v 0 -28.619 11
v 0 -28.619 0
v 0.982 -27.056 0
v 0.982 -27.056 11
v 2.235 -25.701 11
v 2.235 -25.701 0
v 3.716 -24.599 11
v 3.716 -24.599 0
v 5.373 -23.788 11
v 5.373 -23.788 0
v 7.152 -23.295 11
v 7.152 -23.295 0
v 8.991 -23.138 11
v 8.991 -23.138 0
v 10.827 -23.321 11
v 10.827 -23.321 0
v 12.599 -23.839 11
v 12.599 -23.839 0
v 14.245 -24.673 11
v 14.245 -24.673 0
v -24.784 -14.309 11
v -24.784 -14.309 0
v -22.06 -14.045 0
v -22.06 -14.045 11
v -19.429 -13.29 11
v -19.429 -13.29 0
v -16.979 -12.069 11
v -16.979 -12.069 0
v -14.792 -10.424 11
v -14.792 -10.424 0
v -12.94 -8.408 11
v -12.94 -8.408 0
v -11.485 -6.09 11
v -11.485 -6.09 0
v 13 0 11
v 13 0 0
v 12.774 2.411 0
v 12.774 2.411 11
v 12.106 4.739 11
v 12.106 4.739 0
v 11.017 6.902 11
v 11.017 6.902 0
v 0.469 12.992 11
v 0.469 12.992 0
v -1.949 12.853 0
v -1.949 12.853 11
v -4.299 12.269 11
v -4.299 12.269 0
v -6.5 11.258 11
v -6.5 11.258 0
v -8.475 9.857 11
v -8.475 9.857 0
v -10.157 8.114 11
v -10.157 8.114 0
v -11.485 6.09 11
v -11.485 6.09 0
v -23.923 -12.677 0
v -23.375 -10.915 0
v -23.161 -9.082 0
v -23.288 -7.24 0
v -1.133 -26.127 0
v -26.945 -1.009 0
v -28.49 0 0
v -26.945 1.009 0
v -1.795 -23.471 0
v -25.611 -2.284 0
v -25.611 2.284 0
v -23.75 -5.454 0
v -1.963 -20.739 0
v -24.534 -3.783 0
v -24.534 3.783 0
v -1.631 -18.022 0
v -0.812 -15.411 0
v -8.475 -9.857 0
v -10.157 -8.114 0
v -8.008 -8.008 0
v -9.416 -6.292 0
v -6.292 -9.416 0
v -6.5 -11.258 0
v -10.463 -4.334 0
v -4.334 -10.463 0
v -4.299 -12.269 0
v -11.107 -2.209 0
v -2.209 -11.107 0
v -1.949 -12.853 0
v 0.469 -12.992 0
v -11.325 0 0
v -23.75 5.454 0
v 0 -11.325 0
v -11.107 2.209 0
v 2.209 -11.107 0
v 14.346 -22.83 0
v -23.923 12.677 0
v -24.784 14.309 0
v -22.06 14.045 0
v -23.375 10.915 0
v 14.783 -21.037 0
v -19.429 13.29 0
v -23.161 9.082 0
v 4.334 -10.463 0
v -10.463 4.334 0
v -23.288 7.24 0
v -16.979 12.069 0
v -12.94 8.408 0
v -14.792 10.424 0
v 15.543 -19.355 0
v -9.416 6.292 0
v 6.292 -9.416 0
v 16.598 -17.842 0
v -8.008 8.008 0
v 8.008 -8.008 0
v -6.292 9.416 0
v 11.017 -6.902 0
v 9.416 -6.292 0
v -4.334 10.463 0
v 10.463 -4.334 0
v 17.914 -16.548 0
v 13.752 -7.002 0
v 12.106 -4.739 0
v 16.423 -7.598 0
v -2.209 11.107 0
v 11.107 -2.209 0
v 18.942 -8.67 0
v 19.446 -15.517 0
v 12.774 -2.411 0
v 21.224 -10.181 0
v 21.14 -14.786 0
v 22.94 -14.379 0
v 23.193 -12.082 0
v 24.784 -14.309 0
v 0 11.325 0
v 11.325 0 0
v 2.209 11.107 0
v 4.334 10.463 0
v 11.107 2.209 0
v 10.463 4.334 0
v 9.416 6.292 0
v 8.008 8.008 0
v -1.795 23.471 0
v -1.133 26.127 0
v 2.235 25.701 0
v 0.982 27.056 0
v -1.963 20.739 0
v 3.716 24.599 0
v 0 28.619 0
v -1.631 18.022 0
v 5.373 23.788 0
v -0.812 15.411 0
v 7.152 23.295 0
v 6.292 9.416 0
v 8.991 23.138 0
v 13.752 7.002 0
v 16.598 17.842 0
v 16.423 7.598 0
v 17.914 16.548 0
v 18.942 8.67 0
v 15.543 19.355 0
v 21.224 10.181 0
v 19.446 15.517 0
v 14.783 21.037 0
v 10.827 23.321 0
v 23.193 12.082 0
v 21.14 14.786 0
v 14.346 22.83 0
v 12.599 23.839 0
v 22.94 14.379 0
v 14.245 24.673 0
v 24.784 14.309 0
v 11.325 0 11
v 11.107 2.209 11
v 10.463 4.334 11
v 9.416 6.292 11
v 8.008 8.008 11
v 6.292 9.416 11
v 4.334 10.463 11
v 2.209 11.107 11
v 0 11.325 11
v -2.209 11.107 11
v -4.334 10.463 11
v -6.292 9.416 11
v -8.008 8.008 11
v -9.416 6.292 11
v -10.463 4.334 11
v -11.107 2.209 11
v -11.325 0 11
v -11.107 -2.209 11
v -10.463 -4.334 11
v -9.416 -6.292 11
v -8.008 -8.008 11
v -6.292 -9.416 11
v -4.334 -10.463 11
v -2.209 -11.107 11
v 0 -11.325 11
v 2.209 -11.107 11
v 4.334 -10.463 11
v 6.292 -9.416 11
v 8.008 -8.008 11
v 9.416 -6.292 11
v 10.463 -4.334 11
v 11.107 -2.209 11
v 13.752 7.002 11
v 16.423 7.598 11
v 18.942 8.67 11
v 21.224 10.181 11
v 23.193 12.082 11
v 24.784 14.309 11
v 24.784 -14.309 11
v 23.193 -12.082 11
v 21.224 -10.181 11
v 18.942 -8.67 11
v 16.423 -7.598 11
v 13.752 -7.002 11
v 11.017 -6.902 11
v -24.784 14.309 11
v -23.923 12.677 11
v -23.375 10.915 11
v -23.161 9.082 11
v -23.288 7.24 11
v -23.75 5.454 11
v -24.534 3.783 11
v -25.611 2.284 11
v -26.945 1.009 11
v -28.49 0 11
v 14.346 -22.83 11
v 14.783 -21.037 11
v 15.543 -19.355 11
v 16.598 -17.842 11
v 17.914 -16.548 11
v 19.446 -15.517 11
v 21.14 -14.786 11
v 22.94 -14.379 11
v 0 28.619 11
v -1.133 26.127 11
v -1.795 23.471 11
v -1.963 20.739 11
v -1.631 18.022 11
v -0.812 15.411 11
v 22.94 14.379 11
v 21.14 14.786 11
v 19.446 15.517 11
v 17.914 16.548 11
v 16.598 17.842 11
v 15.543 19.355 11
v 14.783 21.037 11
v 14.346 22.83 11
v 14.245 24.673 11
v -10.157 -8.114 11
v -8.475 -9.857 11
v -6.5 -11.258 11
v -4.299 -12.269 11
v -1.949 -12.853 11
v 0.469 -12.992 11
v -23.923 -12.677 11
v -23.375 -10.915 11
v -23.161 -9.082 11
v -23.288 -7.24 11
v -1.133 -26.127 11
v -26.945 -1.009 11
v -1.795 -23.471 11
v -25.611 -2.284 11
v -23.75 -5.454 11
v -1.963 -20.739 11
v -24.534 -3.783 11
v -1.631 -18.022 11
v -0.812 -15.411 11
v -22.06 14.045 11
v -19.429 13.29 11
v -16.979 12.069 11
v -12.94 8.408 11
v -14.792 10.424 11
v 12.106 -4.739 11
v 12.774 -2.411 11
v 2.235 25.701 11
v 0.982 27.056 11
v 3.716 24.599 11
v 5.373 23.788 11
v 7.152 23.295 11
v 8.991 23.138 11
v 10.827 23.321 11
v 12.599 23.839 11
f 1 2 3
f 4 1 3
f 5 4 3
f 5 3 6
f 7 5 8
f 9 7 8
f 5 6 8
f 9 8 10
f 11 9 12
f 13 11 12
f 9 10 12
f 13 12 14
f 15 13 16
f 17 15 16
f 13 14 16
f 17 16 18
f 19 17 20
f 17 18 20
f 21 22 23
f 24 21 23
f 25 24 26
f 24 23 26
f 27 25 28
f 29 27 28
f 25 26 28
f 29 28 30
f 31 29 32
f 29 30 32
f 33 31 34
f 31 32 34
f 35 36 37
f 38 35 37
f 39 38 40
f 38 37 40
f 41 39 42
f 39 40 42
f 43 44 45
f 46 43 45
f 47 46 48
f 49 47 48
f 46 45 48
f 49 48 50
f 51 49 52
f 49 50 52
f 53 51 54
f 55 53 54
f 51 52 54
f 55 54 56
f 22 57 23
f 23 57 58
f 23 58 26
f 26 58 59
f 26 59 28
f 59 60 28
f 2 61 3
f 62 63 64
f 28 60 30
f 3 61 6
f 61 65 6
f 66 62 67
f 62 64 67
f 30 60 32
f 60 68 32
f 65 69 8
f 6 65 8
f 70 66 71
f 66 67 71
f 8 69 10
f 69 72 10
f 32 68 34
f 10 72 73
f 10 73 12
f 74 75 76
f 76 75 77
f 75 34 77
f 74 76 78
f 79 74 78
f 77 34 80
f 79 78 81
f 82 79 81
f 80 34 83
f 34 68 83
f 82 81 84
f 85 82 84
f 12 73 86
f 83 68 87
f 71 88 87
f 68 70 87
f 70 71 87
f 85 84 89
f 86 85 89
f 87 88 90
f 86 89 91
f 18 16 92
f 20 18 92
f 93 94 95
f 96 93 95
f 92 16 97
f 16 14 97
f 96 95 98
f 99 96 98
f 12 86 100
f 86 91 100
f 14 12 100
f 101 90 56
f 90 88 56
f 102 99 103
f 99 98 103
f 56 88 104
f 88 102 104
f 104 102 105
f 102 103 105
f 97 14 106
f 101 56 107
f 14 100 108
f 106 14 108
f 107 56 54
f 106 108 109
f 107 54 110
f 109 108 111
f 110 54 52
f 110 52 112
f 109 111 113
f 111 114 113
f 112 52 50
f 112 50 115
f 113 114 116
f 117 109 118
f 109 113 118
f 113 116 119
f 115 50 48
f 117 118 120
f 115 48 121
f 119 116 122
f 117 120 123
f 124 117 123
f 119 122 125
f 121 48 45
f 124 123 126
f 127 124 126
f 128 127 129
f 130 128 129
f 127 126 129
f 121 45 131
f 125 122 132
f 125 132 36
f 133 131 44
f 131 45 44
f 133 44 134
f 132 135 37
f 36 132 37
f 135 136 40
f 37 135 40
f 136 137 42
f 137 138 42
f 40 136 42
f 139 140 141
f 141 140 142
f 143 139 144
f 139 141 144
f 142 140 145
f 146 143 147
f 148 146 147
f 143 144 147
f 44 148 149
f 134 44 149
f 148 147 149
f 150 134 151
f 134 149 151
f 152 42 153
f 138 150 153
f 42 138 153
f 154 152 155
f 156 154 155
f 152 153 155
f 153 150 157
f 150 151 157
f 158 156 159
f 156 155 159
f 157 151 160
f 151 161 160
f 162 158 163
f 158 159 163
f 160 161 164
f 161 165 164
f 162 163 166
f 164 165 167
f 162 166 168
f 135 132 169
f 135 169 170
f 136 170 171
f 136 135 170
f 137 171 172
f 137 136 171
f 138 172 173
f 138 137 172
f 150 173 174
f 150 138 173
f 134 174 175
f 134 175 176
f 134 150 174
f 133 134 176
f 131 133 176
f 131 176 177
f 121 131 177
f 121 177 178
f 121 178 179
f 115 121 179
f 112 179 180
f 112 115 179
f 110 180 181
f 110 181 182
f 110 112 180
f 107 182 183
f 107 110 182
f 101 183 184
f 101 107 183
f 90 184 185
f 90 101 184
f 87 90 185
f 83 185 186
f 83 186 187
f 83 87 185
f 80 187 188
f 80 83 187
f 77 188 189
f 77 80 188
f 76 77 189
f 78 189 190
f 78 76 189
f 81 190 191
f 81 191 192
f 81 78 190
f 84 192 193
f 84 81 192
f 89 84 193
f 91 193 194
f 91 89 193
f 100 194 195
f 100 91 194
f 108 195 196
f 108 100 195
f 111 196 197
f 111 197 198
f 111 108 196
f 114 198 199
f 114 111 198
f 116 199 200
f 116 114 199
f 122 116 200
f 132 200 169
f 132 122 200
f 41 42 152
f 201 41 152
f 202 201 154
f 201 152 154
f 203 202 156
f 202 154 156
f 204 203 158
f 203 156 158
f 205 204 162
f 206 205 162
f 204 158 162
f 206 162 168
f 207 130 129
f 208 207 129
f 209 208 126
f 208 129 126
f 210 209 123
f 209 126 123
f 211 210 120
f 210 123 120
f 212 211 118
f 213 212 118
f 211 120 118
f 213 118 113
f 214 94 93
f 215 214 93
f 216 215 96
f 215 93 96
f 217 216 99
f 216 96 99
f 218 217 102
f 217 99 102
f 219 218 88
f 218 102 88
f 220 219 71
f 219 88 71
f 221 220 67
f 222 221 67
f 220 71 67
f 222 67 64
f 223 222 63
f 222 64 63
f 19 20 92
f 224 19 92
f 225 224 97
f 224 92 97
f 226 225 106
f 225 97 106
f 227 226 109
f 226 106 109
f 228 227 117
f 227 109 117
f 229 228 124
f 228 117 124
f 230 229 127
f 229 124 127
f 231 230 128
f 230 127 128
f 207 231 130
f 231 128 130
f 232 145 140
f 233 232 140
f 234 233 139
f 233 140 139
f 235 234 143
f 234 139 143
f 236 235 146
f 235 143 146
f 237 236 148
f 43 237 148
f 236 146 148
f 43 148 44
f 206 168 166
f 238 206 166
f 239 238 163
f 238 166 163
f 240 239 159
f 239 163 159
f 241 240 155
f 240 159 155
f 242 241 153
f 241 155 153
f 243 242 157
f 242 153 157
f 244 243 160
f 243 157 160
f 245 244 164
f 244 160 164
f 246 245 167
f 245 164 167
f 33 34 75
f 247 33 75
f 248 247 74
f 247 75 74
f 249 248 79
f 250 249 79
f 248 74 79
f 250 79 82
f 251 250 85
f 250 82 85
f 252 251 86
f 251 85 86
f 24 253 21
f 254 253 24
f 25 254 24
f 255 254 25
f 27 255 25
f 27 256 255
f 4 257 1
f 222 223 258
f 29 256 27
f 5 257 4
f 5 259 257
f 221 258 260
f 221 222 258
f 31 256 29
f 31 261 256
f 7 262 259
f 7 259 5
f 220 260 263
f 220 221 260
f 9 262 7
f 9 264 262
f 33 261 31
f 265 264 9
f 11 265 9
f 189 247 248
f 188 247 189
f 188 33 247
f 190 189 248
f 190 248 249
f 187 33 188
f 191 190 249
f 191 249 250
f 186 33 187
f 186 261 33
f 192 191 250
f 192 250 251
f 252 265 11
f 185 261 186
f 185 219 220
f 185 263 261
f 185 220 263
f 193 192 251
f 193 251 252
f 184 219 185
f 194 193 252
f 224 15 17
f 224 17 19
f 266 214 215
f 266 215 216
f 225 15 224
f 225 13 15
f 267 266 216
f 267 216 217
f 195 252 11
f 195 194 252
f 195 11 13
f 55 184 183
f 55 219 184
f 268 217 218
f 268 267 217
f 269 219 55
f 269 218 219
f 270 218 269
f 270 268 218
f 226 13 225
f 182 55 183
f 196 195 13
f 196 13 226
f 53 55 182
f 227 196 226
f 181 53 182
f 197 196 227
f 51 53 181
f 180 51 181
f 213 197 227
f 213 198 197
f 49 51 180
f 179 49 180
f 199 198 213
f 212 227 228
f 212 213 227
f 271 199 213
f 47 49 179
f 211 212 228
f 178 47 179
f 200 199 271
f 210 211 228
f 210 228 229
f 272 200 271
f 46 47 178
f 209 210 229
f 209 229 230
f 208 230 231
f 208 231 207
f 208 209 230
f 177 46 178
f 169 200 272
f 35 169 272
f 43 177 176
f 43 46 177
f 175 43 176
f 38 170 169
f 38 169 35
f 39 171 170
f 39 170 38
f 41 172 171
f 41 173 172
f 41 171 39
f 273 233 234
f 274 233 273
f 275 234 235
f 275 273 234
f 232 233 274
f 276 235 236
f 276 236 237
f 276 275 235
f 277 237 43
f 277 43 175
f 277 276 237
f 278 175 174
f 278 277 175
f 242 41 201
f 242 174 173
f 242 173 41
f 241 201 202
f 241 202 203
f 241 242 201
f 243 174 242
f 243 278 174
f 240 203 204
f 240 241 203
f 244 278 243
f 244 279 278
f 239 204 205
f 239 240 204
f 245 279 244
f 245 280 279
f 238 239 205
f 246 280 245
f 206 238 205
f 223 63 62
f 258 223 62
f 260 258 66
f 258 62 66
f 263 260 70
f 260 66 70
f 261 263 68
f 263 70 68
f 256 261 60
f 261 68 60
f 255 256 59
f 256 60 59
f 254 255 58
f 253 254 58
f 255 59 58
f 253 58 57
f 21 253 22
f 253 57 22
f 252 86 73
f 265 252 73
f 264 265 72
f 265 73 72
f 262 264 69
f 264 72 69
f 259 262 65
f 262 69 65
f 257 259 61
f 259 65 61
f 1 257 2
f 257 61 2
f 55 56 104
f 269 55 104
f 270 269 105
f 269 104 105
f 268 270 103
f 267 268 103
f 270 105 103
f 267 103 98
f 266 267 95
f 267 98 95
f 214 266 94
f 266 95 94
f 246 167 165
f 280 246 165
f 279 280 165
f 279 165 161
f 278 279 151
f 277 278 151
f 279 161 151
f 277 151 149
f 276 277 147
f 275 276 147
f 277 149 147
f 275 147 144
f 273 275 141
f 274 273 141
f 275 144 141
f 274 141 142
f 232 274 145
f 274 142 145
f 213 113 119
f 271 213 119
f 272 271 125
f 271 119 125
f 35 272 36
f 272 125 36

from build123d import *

# Parameters (mm, degrees)
F0_R     = 11.325
F1_DEPTH = 11


with BuildPart() as f1:
    # F0 (on Top) → F1 (new body)
    with BuildSketch(Plane.XY):
        with BuildLine():
            ThreePointArc((11.016607, -6.901766), (12.494316, -3.590551), (13, 0))
            ThreePointArc((13, 0), (12.494316, 3.590551), (11.016607, 6.901766))
            ThreePointArc((11.016607, 6.901766), (6.5, 11.25833), (0.468801, 12.991544))
            ThreePointArc((0.468801, 12.991544), (-6.5, 11.25833), (-11.485408, 6.089778))
            ThreePointArc((-11.485408, 6.089778), (-13, 0), (-11.485408, -6.089778))
            ThreePointArc((-11.485408, -6.089778), (-6.5, -11.25833), (0.468801, -12.991544))
            ThreePointArc((0.468801, -12.991544), (6.5, -11.25833), (11.016607, -6.901766))
        make_face()
        Circle(F0_R, mode=Mode.SUBTRACT)
        with BuildLine():
            ThreePointArc((0.468801, 12.991544), (6.5, 11.25833), (11.016607, 6.901766))
            ThreePointArc((11.016607, 6.901766), (18.941923, 8.670001), (24.784471, 14.309321))
            ThreePointArc((24.784471, 14.309321), (17.226452, 17.164186), (14.24508, 24.673203))
            ThreePointArc((14.24508, 24.673203), (6.251395, 23.500638), (0, 28.618642))
            ThreePointArc((0, 28.618642), (-1.962521, 20.739187), (0.468801, 12.991544))
        make_face()
        with BuildLine():
            ThreePointArc((24.784471, -14.309321), (18.941923, -8.670001), (11.016607, -6.901766))
            ThreePointArc((11.016607, -6.901766), (6.5, -11.25833), (0.468801, -12.991544))
            ThreePointArc((0.468801, -12.991544), (-1.962521, -20.739187), (0, -28.618642))
            ThreePointArc((0, -28.618642), (6.251395, -23.500638), (14.24508, -24.673203))
            ThreePointArc((14.24508, -24.673203), (17.226452, -17.164186), (24.784471, -14.309321))
        make_face()
        with BuildLine():
            ThreePointArc((-11.485408, -6.089778), (-13, 0), (-11.485408, 6.089778))
            ThreePointArc((-11.485408, 6.089778), (-16.979402, 12.069187), (-24.784471, 14.309321))
            ThreePointArc((-24.784471, 14.309321), (-23.477847, 6.336452), (-28.490161, 0))
            ThreePointArc((-28.490161, 0), (-23.477847, -6.336452), (-24.784471, -14.309321))
            ThreePointArc((-24.784471, -14.309321), (-16.979402, -12.069187), (-11.485408, -6.089778))
        make_face()
    extrude(amount=F1_DEPTH)


solid = f1.part
